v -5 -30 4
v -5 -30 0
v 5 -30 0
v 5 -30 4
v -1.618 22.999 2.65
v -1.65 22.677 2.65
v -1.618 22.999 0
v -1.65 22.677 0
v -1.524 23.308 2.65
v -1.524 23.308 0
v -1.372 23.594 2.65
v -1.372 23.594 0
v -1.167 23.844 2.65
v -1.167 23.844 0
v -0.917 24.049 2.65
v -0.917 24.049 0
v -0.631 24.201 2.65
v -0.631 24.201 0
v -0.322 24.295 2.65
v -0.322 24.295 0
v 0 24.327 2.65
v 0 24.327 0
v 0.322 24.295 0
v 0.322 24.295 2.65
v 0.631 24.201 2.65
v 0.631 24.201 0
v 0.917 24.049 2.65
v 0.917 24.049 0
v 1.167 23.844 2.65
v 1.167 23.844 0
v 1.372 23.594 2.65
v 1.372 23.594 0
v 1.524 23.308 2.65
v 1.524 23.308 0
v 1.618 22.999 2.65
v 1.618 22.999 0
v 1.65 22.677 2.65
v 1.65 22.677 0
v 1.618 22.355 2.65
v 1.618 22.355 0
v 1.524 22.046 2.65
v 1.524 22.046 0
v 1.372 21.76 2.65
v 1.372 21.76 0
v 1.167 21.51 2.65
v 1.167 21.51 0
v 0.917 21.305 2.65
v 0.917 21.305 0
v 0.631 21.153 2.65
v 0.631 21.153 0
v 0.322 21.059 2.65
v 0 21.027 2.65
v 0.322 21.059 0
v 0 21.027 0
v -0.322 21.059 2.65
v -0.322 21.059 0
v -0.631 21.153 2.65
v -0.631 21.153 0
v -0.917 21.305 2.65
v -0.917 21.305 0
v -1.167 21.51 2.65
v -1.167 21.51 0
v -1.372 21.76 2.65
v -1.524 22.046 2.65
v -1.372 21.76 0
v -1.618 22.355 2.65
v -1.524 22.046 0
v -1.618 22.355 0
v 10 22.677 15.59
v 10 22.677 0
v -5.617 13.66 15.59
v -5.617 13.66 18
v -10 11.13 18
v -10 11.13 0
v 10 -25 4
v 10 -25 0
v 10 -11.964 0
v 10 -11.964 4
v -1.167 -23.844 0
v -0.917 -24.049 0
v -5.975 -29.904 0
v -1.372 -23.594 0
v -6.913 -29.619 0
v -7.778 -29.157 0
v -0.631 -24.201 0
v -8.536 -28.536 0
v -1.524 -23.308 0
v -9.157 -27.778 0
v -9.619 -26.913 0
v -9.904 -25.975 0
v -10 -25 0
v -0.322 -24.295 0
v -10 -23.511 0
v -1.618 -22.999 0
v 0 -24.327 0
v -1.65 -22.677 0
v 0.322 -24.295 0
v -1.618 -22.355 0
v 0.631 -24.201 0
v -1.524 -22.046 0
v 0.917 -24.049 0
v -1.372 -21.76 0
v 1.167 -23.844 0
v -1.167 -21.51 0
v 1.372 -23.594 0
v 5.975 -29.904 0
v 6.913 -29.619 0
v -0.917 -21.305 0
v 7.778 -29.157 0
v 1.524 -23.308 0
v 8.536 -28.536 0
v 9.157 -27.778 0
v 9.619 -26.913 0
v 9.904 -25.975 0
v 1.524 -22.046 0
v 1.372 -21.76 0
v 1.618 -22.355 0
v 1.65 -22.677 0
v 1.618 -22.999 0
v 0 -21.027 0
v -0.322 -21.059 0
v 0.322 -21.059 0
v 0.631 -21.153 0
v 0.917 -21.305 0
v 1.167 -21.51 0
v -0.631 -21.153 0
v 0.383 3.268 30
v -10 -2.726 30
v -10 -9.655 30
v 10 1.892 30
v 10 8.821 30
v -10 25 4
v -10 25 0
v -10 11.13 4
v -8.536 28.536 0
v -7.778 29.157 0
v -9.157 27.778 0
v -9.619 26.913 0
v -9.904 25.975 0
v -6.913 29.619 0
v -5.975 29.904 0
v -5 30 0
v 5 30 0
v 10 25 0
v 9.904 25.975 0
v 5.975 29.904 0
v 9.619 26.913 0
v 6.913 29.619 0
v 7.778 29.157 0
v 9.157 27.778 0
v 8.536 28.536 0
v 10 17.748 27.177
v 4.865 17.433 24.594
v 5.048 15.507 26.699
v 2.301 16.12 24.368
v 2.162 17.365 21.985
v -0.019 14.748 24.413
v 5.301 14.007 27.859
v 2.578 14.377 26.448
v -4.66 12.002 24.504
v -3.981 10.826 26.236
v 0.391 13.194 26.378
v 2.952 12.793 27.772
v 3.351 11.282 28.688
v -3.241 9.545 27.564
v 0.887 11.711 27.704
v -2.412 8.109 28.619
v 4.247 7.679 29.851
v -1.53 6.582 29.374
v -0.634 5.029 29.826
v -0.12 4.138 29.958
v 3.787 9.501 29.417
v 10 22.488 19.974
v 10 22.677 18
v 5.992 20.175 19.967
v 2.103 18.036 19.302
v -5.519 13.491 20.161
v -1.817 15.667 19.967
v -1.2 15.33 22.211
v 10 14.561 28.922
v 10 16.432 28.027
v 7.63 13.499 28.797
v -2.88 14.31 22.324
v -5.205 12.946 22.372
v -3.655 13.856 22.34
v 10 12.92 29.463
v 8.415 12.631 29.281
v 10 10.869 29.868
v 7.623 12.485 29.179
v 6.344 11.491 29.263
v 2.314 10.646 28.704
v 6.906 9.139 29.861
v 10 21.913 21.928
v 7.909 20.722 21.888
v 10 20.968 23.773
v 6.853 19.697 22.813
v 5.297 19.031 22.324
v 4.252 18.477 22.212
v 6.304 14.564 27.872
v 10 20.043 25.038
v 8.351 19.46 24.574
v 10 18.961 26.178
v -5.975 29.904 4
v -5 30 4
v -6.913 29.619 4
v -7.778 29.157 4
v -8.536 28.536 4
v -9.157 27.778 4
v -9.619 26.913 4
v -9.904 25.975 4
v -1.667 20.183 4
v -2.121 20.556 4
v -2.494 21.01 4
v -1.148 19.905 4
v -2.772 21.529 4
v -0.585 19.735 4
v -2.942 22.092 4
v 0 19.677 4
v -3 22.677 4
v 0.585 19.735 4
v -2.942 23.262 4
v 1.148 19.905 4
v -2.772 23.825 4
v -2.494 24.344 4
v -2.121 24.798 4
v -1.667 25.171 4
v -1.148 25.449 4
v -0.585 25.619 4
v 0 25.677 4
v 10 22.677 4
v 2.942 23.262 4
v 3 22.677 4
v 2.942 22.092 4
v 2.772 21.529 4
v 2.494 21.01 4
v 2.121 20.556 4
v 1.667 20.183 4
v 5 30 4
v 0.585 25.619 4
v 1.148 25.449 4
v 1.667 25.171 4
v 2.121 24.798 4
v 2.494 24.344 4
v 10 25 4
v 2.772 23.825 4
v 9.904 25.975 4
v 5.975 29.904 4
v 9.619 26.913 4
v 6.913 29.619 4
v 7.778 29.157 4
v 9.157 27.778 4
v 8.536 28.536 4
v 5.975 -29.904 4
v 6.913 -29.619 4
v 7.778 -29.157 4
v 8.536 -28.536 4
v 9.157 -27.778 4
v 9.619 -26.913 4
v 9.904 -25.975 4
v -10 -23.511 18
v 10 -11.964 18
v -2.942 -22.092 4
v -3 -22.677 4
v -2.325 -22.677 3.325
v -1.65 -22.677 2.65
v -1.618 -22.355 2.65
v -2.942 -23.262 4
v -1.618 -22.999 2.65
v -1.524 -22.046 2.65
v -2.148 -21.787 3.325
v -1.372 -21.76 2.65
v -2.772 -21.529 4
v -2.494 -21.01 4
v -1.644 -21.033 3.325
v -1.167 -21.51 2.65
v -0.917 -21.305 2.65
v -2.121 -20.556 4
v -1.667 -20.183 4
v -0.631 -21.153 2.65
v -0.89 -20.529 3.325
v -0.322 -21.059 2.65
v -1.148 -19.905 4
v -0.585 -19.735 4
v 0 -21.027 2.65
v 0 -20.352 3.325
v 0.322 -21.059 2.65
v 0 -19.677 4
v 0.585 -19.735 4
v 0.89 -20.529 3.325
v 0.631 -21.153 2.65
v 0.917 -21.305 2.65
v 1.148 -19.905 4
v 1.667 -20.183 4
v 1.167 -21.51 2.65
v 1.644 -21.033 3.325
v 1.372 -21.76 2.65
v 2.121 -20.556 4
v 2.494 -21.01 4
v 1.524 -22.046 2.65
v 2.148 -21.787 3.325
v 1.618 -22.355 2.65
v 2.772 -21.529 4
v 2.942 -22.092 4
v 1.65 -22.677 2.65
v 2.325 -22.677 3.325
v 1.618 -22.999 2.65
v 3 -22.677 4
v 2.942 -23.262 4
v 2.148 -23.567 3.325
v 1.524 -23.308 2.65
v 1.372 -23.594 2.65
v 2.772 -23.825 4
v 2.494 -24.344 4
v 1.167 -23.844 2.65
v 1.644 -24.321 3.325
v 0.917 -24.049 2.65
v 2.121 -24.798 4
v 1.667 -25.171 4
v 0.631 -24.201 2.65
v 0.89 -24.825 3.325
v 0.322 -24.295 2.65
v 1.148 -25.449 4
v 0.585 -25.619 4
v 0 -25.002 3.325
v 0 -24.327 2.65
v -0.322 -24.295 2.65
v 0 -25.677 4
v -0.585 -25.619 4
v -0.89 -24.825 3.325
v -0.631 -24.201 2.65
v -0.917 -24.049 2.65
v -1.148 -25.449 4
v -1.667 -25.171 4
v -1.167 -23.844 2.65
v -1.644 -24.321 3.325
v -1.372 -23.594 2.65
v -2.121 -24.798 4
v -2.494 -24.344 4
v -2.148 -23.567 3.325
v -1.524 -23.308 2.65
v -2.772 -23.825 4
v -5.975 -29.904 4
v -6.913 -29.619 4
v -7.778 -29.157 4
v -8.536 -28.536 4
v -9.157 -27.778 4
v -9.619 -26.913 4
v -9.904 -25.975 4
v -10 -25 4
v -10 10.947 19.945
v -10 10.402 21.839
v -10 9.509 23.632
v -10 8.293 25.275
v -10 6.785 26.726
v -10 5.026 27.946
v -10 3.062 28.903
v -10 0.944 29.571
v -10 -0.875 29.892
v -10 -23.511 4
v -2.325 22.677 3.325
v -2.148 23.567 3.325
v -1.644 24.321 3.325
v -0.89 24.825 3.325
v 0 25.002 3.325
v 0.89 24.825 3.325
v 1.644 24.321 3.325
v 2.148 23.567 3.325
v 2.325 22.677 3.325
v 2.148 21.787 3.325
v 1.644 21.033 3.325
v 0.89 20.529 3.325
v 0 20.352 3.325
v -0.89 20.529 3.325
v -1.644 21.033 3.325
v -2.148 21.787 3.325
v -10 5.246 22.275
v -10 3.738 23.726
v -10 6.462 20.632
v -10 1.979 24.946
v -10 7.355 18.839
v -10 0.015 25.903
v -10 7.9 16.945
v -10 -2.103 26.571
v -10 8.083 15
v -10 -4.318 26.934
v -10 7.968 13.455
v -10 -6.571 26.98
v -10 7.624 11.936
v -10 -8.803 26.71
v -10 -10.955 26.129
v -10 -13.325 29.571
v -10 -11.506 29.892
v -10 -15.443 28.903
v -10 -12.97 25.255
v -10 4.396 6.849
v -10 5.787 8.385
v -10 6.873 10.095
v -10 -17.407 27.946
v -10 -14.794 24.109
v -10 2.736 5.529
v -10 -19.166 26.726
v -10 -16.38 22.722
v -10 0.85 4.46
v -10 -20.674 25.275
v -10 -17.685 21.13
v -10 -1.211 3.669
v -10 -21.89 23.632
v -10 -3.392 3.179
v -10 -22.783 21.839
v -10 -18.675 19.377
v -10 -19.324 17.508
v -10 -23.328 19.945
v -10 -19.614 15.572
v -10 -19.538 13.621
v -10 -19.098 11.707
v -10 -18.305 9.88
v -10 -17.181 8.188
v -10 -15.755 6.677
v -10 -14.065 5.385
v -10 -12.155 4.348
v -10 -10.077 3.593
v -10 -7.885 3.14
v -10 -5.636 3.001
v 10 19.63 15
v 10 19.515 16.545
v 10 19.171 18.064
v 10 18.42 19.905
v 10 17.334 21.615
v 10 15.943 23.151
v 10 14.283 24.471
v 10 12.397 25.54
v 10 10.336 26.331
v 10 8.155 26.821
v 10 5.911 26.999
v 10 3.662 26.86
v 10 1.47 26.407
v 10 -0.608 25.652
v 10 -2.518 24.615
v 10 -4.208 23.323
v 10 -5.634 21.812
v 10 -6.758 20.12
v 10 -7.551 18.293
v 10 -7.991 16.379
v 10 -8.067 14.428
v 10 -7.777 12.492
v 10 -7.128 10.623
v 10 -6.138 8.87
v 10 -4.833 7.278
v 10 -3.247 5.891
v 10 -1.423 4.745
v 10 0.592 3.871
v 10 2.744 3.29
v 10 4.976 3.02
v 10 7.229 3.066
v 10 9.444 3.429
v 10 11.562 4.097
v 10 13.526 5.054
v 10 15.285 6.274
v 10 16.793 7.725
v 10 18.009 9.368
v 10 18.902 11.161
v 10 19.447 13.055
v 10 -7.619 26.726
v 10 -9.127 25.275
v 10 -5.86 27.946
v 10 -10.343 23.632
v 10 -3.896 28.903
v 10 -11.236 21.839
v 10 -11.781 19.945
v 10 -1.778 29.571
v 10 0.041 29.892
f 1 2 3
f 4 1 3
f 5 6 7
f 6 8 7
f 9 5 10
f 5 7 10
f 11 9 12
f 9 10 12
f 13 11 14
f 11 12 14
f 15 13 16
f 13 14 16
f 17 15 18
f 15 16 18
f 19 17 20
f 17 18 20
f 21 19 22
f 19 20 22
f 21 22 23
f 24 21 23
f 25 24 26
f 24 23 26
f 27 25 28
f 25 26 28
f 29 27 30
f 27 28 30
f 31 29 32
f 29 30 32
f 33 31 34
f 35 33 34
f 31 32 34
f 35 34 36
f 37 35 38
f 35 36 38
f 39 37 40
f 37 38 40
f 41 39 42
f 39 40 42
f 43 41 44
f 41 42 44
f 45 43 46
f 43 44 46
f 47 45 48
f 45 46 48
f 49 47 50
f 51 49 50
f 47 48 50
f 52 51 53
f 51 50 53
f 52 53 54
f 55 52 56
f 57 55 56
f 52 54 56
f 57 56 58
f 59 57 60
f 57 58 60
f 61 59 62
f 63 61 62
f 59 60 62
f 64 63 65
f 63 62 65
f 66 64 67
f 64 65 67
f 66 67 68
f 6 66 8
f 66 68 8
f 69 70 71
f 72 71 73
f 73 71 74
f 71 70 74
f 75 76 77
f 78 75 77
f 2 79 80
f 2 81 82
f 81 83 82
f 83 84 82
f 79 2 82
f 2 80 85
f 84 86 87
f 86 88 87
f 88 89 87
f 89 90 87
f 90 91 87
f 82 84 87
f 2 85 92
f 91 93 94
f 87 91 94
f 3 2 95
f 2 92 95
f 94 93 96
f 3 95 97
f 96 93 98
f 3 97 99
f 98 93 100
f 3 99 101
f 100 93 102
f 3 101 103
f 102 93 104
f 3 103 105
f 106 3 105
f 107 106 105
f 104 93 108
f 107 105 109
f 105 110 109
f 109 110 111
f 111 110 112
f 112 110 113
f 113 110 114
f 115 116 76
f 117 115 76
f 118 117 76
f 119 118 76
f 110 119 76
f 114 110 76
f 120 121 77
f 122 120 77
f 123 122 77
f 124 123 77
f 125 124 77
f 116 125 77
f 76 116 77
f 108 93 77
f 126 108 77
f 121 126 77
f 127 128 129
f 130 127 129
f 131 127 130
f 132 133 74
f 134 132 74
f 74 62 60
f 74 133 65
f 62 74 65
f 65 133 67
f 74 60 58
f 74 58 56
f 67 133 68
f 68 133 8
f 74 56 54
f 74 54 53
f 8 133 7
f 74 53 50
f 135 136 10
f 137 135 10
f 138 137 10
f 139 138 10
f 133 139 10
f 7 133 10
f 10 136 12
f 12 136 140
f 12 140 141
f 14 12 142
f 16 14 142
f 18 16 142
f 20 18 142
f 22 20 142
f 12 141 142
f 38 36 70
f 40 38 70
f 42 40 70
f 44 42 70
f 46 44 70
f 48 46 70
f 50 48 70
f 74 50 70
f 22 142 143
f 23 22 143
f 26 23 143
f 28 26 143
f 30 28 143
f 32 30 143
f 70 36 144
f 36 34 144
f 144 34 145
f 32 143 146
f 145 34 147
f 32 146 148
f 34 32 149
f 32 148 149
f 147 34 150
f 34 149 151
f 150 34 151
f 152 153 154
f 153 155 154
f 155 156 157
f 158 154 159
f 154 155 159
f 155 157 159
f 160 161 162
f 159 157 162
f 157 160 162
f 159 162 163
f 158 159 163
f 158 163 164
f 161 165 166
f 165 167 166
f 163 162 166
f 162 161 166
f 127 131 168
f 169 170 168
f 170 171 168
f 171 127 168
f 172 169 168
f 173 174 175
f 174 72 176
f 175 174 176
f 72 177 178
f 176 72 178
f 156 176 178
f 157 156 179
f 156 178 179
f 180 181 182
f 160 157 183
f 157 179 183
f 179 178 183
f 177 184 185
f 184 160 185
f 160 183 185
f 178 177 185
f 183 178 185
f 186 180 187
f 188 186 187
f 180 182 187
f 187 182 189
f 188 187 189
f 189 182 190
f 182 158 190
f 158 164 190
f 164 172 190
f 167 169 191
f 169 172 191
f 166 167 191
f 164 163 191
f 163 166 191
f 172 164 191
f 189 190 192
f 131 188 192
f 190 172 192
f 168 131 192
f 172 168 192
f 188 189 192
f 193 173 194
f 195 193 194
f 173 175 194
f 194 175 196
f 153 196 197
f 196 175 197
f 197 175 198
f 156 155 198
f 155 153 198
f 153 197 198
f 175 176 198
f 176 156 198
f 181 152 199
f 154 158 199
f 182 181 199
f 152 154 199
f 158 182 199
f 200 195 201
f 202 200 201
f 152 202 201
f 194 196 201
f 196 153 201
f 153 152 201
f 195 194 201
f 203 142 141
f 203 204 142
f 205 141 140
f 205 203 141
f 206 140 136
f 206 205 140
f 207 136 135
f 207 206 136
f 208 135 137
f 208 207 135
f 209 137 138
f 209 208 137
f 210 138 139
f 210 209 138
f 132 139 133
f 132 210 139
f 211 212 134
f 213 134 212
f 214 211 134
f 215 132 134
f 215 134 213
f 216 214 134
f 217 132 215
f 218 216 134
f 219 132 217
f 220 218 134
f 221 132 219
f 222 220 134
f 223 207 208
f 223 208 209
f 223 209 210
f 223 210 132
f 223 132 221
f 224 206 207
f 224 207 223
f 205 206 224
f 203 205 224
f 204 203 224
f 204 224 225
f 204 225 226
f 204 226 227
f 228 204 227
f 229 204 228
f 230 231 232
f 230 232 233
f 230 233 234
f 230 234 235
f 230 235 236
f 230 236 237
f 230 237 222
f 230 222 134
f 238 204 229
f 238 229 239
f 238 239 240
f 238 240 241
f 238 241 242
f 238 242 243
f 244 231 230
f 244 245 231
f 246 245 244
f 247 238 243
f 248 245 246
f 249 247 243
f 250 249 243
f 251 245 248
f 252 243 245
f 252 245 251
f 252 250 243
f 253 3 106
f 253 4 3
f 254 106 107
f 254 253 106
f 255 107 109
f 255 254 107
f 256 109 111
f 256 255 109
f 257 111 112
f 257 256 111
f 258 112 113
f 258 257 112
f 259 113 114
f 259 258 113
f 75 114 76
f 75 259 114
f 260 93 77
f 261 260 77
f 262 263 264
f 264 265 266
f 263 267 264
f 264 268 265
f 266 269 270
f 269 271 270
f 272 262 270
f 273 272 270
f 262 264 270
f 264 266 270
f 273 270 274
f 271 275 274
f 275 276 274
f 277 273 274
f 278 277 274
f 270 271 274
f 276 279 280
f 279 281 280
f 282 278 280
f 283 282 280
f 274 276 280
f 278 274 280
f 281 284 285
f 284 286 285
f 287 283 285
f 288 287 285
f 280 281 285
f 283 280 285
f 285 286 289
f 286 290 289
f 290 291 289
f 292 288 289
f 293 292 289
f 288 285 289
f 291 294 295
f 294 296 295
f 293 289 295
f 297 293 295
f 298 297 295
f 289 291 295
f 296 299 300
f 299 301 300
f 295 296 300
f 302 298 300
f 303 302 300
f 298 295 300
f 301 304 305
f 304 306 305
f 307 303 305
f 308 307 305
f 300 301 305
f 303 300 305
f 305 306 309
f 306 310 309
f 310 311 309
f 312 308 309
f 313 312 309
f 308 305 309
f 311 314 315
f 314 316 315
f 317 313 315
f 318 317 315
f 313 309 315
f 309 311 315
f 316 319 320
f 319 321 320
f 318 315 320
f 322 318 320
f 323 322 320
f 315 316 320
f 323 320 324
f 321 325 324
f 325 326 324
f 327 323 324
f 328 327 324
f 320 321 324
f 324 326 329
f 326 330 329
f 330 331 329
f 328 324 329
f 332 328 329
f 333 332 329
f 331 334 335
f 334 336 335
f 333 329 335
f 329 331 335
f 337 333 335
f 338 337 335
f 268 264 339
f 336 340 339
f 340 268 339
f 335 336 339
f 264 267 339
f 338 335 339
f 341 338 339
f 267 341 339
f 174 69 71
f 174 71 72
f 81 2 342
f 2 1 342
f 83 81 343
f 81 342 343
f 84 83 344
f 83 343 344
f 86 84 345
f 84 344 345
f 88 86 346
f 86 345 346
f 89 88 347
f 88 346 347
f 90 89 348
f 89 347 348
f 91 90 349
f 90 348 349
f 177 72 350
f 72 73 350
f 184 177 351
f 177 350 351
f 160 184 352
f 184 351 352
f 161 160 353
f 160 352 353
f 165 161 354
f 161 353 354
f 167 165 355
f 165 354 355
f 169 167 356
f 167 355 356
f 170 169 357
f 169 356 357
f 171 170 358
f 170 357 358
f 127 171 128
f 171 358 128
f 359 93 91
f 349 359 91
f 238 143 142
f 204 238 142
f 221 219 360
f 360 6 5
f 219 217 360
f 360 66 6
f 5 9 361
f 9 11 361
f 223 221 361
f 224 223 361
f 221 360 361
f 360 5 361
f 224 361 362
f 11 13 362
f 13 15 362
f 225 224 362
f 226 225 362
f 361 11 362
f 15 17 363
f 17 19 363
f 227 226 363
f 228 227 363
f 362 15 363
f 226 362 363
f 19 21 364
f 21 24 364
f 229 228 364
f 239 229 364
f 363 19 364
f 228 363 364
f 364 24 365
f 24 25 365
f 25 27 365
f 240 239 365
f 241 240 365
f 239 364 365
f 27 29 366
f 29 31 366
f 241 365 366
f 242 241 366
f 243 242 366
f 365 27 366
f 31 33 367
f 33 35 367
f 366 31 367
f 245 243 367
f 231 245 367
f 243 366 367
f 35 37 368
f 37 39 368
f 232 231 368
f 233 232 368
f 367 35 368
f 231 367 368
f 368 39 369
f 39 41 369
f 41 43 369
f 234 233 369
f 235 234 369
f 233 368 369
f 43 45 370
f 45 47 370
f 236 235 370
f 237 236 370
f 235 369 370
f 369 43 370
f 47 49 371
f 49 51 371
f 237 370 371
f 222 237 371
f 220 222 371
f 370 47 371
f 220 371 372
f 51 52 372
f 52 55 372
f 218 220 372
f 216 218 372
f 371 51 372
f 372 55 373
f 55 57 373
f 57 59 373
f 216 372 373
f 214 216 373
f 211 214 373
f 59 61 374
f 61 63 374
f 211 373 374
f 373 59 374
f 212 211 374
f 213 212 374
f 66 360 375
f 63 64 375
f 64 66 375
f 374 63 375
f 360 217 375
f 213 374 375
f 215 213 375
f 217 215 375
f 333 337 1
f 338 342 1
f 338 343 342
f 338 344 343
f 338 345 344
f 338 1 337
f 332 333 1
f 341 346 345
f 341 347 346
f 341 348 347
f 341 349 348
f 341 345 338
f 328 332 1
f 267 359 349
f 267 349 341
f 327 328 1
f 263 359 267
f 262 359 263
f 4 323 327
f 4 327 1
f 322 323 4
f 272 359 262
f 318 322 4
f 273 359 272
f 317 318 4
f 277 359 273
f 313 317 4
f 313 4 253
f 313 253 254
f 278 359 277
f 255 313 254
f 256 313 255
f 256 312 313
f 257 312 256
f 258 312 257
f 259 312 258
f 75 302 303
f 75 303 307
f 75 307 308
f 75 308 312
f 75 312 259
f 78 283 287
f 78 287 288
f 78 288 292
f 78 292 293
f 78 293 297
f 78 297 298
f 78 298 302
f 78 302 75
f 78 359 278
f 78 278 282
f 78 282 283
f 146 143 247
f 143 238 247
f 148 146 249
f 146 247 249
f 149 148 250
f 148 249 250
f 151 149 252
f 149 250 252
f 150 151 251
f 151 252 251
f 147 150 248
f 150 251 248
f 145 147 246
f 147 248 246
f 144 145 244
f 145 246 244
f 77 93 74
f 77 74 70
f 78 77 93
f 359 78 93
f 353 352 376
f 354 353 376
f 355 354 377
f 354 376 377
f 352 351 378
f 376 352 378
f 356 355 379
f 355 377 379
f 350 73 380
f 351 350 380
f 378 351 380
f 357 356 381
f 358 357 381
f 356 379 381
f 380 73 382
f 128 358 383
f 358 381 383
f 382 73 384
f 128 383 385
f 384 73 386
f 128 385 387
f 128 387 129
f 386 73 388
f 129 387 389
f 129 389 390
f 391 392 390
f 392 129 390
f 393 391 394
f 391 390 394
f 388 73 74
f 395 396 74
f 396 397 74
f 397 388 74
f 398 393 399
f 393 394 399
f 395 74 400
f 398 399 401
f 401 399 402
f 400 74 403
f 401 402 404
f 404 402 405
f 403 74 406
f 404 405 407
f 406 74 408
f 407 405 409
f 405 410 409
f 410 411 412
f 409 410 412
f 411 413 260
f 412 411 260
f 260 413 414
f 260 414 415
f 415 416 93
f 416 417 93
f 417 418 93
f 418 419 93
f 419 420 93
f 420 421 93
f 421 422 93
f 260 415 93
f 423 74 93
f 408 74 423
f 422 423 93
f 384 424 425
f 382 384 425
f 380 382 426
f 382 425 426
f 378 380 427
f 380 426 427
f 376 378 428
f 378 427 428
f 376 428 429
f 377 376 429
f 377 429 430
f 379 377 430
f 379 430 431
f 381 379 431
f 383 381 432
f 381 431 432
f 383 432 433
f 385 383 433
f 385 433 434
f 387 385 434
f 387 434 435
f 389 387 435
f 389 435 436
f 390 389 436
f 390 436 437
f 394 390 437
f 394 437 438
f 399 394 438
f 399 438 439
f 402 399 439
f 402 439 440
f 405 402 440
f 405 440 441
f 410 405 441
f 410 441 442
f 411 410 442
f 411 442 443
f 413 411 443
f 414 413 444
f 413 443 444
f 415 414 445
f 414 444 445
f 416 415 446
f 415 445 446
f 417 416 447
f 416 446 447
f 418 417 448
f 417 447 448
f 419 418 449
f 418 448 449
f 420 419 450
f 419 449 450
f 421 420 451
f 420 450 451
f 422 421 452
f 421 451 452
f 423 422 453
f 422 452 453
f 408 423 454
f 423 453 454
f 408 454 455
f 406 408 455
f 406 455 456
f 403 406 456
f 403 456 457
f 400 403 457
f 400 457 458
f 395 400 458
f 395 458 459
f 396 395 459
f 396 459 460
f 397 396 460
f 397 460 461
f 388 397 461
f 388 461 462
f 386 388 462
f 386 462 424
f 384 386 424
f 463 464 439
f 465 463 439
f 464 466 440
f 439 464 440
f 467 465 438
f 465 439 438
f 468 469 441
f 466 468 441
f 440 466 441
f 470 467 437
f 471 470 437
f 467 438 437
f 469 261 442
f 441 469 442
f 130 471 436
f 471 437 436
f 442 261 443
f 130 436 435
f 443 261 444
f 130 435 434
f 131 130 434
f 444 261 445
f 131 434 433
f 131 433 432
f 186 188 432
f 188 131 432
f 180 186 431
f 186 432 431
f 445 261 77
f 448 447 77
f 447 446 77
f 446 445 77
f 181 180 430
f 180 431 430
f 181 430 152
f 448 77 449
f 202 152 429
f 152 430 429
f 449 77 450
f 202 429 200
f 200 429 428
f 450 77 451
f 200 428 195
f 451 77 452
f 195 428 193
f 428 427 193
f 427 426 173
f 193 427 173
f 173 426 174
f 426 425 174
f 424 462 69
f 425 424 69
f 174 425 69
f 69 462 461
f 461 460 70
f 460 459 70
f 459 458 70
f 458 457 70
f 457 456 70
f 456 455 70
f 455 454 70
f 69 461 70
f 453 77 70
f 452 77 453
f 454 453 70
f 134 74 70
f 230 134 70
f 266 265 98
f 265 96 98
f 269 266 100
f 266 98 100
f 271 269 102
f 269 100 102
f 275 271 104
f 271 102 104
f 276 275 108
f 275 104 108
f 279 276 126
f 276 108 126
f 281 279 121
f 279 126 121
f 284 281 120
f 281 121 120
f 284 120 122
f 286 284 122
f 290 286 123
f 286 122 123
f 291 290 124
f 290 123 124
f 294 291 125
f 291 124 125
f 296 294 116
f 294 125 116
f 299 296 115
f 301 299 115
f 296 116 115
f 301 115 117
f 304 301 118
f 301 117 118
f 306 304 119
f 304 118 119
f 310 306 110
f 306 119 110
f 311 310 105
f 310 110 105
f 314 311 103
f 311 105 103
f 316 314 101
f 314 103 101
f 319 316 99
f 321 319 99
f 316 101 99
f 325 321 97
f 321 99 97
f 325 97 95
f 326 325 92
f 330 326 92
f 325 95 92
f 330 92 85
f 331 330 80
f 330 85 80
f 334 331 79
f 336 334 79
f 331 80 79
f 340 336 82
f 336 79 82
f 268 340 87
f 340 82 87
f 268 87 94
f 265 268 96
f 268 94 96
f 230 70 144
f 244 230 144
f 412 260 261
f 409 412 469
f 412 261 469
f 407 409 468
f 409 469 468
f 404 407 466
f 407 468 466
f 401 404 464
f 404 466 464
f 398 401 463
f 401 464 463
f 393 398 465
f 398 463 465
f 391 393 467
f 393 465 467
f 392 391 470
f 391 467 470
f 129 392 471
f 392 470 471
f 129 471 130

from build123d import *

# Parameters (mm, degrees)
F1_DEPTH          = 4
F2_DEPTH          = 30
F3_W              = 18.0332418531
F3_H              = 11.783156544
F4_DEPTH          = 25
F6_R              = 12
F7_DEPTH          = 67.5
F7_DEPTH_BACK     = 25
F8_DEPTH          = 25
F10_D             = 3.3
F10_CSINK_D       = 6
F10_CSINK_ANGLE   = 90
F10_2_D           = 3.3
F10_2_CSINK_D     = 6
F10_2_CSINK_ANGLE = 90
F11_R             = 5
F11_2_R           = 5
F12_R             = 12


with BuildPart() as f1:
    # F0 (on Top) → F1 (new body)
    with BuildSketch(Plane.XY):
        Polygon((10, 30), (-10, 30), (-10, 11.1300059103), (10, 22.677011294), align=None)
    extrude(amount=F1_DEPTH)

    # F10 (through all)
    with Locations(Plane.XY.offset(4)):
        with Locations((0, 22.677011294), (0, -22.677011294)):
            CounterSinkHole(F10_D / 2, F10_CSINK_D / 2, counter_sink_angle=F10_CSINK_ANGLE)

    # F11
    f11_edges = [f1.edges().sort_by_distance(p)[0] for p in [
        (-10, 30, 2),
        (10, 30, 2),
    ]]
    fillet(f11_edges, radius=F11_R)


with BuildPart() as f1b:
    # F0 (on Top) → F1, piece 2 (new body)
    with BuildSketch(Plane.XY):
        Polygon((10, -11.9640048573), (-10, -23.5110102411), (-10, -30), (10, -30), align=None)
    extrude(amount=F1_DEPTH)

    # F10#2 (through all)
    with Locations(Plane.XY.offset(4)):
        with Locations((0, 22.677011294), (0, -22.677011294)):
            CounterSinkHole(F10_2_D / 2, F10_2_CSINK_D / 2, counter_sink_angle=F10_2_CSINK_ANGLE)

    # F11#2
    f11_2_edges = [f1b.edges().sort_by_distance(p)[0] for p in [
        (10, -30, 2),
        (-10, -30, 2),
    ]]
    fillet(f11_2_edges, radius=F11_2_R)


with BuildPart() as f2:
    # F0 (on Top) → F2 (new body)
    with BuildSketch(Plane.XY):
        Polygon((10, 22.677011294), (-10, 11.1300059103), (-10, -23.5110102411), (10, -11.9640048573), align=None)
    extrude(amount=F2_DEPTH)

    # F3 (on face) → F4 (join)
    with BuildSketch(Plane(origin=(-7.3194339313, 12.6776314516, 0), x_dir=(-0.8660254038, -0.5, 0), z_dir=(-0.5, 0.8660254038, 0))):
        with Locations((-10.9821387583, 21.4814543724)):
            Rectangle(F3_W, F3_H)
    extrude(amount=F4_DEPTH)

    # F6 (on offset) → F7 (cut, two sides)
    with BuildSketch(Plane(origin=(17.3194339313, 9.9993798424, 0), x_dir=(-0.5, 0.8660254038, 0), z_dir=(0.8660254038, 0.5, 0))) as f7_sk:
        with Locations((0, 15)):
            Circle(F6_R)
    extrude(amount=-F7_DEPTH, mode=Mode.SUBTRACT)
    extrude(f7_sk.sketch, amount=F7_DEPTH_BACK, mode=Mode.SUBTRACT)

    # F8 (cut): a face of the model
    f8_faces = [f2.faces().sort_by_distance(p)[0] for p in [
        (3.75, 33.5023288414, 21.4814543724),
    ]]
    extrude(f8_faces, amount=-F8_DEPTH, mode=Mode.SUBTRACT)

    # F12
    f12_edges = [f2.edges().sort_by_distance(p)[0] for p in [
        (0, 16.903509, 30),
        (0, -17.737508, 30),
    ]]
    fillet(f12_edges, radius=F12_R)


solid = Compound([f1.part, f1b.part, f2.part])
